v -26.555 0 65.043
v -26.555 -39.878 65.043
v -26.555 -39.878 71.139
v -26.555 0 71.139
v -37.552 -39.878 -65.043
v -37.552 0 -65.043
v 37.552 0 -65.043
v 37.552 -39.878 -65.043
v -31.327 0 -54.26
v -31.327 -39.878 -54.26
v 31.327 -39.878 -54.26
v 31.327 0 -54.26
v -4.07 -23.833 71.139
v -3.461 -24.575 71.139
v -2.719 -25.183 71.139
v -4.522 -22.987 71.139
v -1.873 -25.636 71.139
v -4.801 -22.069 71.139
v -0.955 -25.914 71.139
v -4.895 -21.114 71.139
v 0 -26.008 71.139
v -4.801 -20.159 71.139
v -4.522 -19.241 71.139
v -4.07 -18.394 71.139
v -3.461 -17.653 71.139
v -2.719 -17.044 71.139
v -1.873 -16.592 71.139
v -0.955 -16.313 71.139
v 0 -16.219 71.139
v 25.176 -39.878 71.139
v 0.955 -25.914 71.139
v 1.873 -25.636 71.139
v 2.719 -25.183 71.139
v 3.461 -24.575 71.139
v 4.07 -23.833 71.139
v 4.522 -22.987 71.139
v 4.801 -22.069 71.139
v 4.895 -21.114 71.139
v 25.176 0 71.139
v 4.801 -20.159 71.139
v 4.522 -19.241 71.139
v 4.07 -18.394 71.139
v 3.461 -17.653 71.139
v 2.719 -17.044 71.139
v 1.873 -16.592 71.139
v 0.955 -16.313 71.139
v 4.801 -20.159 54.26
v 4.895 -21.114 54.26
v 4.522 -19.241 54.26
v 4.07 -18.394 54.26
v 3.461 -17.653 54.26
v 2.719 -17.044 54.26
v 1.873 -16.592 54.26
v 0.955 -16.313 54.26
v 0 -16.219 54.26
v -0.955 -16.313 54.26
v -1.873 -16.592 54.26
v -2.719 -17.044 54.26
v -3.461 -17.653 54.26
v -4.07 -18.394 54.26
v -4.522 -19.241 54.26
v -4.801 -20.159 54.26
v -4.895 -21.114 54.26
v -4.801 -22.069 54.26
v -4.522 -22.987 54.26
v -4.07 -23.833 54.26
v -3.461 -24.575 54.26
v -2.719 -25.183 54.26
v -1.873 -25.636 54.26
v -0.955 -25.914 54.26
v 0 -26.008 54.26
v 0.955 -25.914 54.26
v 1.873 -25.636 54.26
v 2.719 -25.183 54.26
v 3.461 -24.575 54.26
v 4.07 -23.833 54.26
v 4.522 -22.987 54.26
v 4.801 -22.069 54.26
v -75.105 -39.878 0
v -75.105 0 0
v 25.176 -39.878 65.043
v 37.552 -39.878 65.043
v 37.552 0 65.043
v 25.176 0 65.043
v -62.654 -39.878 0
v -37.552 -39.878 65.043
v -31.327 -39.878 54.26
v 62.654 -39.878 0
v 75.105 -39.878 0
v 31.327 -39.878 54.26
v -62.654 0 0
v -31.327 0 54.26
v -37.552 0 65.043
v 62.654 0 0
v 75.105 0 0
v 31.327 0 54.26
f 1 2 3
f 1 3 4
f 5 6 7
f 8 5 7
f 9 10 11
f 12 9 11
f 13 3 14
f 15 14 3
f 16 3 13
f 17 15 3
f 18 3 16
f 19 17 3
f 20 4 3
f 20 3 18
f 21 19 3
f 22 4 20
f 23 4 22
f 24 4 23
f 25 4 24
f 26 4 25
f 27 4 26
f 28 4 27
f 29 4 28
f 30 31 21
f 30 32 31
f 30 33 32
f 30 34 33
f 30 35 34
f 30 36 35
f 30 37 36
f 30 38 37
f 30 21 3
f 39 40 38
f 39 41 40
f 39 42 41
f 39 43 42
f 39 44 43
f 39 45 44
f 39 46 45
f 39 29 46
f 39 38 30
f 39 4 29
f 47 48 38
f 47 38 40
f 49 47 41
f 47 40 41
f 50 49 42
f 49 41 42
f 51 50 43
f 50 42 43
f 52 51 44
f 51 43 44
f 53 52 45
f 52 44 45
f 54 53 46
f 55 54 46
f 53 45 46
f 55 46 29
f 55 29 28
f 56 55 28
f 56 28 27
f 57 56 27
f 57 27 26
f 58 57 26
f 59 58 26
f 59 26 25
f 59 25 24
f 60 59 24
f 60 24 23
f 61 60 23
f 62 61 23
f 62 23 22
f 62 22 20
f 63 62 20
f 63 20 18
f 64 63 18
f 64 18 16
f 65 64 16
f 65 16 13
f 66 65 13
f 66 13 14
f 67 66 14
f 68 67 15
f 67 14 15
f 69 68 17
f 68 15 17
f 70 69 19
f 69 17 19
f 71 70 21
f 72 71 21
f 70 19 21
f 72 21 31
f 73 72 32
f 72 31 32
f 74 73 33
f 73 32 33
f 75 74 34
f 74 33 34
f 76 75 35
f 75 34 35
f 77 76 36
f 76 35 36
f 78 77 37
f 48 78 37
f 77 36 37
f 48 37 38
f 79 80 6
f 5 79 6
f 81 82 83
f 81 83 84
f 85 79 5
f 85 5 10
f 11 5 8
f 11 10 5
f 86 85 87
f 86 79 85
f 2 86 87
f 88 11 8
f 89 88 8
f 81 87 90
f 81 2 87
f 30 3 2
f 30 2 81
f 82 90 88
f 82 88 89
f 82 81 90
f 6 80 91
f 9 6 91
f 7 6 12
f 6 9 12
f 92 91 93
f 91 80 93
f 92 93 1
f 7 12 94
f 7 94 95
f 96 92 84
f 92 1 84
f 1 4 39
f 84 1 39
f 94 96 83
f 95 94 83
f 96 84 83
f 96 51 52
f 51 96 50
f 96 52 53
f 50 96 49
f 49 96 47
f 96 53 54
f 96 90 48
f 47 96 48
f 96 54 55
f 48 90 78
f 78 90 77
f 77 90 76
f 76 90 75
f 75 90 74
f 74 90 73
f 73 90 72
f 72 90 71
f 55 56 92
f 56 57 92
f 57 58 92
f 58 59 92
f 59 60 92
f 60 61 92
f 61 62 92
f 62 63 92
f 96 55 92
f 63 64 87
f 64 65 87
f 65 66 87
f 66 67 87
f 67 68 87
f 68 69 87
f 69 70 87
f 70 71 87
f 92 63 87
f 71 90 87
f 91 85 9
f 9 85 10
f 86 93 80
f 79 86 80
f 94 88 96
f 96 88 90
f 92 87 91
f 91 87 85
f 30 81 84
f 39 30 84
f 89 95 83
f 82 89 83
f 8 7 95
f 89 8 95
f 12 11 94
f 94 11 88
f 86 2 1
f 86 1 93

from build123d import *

# Parameters (mm, degrees)
F1_DEPTH = 39.878
F3_DEPTH = 58.42
F4_W     = 51.730605
F4_H     = 39.878
F5_DEPTH = 6.096
F6_R     = 4.89455
F7_DEPTH = 25.4


with BuildPart() as f1:
    # F0 (on Front) → F1 (new body)
    with BuildSketch(Plane.XZ):
        Polygon((37.552367, 65.042607), (-37.552367, 65.042607), (-75.104734, 0), (-37.552367, -65.042607), (37.552367, -65.042607), (75.104734, 0), align=None)
    extrude(amount=F1_DEPTH)

    # F2 (on face) → F3 (cut)
    with BuildSketch(Plane.XZ.offset(39.878)):
        Polygon((31.326826, 54.259654), (-31.326826, 54.259654), (-62.653652, 0), (-31.326826, -54.259654), (31.326826, -54.259654), (62.653652, 0), align=None)
    extrude(amount=-F3_DEPTH, mode=Mode.SUBTRACT)

    # F4 (on face) → F5 (join)
    with BuildSketch(Plane.XY.offset(65.042607)):
        with Locations((-0.68974, -19.939)):
            Rectangle(F4_W, F4_H)
    extrude(amount=F5_DEPTH)

    # F6 (on face) → F7 (cut)
    with BuildSketch(Plane.XY.offset(71.138607)):
        with Locations((0, -21.113751)):
            Circle(F6_R)
    extrude(amount=-F7_DEPTH, mode=Mode.SUBTRACT)


solid = f1.part
